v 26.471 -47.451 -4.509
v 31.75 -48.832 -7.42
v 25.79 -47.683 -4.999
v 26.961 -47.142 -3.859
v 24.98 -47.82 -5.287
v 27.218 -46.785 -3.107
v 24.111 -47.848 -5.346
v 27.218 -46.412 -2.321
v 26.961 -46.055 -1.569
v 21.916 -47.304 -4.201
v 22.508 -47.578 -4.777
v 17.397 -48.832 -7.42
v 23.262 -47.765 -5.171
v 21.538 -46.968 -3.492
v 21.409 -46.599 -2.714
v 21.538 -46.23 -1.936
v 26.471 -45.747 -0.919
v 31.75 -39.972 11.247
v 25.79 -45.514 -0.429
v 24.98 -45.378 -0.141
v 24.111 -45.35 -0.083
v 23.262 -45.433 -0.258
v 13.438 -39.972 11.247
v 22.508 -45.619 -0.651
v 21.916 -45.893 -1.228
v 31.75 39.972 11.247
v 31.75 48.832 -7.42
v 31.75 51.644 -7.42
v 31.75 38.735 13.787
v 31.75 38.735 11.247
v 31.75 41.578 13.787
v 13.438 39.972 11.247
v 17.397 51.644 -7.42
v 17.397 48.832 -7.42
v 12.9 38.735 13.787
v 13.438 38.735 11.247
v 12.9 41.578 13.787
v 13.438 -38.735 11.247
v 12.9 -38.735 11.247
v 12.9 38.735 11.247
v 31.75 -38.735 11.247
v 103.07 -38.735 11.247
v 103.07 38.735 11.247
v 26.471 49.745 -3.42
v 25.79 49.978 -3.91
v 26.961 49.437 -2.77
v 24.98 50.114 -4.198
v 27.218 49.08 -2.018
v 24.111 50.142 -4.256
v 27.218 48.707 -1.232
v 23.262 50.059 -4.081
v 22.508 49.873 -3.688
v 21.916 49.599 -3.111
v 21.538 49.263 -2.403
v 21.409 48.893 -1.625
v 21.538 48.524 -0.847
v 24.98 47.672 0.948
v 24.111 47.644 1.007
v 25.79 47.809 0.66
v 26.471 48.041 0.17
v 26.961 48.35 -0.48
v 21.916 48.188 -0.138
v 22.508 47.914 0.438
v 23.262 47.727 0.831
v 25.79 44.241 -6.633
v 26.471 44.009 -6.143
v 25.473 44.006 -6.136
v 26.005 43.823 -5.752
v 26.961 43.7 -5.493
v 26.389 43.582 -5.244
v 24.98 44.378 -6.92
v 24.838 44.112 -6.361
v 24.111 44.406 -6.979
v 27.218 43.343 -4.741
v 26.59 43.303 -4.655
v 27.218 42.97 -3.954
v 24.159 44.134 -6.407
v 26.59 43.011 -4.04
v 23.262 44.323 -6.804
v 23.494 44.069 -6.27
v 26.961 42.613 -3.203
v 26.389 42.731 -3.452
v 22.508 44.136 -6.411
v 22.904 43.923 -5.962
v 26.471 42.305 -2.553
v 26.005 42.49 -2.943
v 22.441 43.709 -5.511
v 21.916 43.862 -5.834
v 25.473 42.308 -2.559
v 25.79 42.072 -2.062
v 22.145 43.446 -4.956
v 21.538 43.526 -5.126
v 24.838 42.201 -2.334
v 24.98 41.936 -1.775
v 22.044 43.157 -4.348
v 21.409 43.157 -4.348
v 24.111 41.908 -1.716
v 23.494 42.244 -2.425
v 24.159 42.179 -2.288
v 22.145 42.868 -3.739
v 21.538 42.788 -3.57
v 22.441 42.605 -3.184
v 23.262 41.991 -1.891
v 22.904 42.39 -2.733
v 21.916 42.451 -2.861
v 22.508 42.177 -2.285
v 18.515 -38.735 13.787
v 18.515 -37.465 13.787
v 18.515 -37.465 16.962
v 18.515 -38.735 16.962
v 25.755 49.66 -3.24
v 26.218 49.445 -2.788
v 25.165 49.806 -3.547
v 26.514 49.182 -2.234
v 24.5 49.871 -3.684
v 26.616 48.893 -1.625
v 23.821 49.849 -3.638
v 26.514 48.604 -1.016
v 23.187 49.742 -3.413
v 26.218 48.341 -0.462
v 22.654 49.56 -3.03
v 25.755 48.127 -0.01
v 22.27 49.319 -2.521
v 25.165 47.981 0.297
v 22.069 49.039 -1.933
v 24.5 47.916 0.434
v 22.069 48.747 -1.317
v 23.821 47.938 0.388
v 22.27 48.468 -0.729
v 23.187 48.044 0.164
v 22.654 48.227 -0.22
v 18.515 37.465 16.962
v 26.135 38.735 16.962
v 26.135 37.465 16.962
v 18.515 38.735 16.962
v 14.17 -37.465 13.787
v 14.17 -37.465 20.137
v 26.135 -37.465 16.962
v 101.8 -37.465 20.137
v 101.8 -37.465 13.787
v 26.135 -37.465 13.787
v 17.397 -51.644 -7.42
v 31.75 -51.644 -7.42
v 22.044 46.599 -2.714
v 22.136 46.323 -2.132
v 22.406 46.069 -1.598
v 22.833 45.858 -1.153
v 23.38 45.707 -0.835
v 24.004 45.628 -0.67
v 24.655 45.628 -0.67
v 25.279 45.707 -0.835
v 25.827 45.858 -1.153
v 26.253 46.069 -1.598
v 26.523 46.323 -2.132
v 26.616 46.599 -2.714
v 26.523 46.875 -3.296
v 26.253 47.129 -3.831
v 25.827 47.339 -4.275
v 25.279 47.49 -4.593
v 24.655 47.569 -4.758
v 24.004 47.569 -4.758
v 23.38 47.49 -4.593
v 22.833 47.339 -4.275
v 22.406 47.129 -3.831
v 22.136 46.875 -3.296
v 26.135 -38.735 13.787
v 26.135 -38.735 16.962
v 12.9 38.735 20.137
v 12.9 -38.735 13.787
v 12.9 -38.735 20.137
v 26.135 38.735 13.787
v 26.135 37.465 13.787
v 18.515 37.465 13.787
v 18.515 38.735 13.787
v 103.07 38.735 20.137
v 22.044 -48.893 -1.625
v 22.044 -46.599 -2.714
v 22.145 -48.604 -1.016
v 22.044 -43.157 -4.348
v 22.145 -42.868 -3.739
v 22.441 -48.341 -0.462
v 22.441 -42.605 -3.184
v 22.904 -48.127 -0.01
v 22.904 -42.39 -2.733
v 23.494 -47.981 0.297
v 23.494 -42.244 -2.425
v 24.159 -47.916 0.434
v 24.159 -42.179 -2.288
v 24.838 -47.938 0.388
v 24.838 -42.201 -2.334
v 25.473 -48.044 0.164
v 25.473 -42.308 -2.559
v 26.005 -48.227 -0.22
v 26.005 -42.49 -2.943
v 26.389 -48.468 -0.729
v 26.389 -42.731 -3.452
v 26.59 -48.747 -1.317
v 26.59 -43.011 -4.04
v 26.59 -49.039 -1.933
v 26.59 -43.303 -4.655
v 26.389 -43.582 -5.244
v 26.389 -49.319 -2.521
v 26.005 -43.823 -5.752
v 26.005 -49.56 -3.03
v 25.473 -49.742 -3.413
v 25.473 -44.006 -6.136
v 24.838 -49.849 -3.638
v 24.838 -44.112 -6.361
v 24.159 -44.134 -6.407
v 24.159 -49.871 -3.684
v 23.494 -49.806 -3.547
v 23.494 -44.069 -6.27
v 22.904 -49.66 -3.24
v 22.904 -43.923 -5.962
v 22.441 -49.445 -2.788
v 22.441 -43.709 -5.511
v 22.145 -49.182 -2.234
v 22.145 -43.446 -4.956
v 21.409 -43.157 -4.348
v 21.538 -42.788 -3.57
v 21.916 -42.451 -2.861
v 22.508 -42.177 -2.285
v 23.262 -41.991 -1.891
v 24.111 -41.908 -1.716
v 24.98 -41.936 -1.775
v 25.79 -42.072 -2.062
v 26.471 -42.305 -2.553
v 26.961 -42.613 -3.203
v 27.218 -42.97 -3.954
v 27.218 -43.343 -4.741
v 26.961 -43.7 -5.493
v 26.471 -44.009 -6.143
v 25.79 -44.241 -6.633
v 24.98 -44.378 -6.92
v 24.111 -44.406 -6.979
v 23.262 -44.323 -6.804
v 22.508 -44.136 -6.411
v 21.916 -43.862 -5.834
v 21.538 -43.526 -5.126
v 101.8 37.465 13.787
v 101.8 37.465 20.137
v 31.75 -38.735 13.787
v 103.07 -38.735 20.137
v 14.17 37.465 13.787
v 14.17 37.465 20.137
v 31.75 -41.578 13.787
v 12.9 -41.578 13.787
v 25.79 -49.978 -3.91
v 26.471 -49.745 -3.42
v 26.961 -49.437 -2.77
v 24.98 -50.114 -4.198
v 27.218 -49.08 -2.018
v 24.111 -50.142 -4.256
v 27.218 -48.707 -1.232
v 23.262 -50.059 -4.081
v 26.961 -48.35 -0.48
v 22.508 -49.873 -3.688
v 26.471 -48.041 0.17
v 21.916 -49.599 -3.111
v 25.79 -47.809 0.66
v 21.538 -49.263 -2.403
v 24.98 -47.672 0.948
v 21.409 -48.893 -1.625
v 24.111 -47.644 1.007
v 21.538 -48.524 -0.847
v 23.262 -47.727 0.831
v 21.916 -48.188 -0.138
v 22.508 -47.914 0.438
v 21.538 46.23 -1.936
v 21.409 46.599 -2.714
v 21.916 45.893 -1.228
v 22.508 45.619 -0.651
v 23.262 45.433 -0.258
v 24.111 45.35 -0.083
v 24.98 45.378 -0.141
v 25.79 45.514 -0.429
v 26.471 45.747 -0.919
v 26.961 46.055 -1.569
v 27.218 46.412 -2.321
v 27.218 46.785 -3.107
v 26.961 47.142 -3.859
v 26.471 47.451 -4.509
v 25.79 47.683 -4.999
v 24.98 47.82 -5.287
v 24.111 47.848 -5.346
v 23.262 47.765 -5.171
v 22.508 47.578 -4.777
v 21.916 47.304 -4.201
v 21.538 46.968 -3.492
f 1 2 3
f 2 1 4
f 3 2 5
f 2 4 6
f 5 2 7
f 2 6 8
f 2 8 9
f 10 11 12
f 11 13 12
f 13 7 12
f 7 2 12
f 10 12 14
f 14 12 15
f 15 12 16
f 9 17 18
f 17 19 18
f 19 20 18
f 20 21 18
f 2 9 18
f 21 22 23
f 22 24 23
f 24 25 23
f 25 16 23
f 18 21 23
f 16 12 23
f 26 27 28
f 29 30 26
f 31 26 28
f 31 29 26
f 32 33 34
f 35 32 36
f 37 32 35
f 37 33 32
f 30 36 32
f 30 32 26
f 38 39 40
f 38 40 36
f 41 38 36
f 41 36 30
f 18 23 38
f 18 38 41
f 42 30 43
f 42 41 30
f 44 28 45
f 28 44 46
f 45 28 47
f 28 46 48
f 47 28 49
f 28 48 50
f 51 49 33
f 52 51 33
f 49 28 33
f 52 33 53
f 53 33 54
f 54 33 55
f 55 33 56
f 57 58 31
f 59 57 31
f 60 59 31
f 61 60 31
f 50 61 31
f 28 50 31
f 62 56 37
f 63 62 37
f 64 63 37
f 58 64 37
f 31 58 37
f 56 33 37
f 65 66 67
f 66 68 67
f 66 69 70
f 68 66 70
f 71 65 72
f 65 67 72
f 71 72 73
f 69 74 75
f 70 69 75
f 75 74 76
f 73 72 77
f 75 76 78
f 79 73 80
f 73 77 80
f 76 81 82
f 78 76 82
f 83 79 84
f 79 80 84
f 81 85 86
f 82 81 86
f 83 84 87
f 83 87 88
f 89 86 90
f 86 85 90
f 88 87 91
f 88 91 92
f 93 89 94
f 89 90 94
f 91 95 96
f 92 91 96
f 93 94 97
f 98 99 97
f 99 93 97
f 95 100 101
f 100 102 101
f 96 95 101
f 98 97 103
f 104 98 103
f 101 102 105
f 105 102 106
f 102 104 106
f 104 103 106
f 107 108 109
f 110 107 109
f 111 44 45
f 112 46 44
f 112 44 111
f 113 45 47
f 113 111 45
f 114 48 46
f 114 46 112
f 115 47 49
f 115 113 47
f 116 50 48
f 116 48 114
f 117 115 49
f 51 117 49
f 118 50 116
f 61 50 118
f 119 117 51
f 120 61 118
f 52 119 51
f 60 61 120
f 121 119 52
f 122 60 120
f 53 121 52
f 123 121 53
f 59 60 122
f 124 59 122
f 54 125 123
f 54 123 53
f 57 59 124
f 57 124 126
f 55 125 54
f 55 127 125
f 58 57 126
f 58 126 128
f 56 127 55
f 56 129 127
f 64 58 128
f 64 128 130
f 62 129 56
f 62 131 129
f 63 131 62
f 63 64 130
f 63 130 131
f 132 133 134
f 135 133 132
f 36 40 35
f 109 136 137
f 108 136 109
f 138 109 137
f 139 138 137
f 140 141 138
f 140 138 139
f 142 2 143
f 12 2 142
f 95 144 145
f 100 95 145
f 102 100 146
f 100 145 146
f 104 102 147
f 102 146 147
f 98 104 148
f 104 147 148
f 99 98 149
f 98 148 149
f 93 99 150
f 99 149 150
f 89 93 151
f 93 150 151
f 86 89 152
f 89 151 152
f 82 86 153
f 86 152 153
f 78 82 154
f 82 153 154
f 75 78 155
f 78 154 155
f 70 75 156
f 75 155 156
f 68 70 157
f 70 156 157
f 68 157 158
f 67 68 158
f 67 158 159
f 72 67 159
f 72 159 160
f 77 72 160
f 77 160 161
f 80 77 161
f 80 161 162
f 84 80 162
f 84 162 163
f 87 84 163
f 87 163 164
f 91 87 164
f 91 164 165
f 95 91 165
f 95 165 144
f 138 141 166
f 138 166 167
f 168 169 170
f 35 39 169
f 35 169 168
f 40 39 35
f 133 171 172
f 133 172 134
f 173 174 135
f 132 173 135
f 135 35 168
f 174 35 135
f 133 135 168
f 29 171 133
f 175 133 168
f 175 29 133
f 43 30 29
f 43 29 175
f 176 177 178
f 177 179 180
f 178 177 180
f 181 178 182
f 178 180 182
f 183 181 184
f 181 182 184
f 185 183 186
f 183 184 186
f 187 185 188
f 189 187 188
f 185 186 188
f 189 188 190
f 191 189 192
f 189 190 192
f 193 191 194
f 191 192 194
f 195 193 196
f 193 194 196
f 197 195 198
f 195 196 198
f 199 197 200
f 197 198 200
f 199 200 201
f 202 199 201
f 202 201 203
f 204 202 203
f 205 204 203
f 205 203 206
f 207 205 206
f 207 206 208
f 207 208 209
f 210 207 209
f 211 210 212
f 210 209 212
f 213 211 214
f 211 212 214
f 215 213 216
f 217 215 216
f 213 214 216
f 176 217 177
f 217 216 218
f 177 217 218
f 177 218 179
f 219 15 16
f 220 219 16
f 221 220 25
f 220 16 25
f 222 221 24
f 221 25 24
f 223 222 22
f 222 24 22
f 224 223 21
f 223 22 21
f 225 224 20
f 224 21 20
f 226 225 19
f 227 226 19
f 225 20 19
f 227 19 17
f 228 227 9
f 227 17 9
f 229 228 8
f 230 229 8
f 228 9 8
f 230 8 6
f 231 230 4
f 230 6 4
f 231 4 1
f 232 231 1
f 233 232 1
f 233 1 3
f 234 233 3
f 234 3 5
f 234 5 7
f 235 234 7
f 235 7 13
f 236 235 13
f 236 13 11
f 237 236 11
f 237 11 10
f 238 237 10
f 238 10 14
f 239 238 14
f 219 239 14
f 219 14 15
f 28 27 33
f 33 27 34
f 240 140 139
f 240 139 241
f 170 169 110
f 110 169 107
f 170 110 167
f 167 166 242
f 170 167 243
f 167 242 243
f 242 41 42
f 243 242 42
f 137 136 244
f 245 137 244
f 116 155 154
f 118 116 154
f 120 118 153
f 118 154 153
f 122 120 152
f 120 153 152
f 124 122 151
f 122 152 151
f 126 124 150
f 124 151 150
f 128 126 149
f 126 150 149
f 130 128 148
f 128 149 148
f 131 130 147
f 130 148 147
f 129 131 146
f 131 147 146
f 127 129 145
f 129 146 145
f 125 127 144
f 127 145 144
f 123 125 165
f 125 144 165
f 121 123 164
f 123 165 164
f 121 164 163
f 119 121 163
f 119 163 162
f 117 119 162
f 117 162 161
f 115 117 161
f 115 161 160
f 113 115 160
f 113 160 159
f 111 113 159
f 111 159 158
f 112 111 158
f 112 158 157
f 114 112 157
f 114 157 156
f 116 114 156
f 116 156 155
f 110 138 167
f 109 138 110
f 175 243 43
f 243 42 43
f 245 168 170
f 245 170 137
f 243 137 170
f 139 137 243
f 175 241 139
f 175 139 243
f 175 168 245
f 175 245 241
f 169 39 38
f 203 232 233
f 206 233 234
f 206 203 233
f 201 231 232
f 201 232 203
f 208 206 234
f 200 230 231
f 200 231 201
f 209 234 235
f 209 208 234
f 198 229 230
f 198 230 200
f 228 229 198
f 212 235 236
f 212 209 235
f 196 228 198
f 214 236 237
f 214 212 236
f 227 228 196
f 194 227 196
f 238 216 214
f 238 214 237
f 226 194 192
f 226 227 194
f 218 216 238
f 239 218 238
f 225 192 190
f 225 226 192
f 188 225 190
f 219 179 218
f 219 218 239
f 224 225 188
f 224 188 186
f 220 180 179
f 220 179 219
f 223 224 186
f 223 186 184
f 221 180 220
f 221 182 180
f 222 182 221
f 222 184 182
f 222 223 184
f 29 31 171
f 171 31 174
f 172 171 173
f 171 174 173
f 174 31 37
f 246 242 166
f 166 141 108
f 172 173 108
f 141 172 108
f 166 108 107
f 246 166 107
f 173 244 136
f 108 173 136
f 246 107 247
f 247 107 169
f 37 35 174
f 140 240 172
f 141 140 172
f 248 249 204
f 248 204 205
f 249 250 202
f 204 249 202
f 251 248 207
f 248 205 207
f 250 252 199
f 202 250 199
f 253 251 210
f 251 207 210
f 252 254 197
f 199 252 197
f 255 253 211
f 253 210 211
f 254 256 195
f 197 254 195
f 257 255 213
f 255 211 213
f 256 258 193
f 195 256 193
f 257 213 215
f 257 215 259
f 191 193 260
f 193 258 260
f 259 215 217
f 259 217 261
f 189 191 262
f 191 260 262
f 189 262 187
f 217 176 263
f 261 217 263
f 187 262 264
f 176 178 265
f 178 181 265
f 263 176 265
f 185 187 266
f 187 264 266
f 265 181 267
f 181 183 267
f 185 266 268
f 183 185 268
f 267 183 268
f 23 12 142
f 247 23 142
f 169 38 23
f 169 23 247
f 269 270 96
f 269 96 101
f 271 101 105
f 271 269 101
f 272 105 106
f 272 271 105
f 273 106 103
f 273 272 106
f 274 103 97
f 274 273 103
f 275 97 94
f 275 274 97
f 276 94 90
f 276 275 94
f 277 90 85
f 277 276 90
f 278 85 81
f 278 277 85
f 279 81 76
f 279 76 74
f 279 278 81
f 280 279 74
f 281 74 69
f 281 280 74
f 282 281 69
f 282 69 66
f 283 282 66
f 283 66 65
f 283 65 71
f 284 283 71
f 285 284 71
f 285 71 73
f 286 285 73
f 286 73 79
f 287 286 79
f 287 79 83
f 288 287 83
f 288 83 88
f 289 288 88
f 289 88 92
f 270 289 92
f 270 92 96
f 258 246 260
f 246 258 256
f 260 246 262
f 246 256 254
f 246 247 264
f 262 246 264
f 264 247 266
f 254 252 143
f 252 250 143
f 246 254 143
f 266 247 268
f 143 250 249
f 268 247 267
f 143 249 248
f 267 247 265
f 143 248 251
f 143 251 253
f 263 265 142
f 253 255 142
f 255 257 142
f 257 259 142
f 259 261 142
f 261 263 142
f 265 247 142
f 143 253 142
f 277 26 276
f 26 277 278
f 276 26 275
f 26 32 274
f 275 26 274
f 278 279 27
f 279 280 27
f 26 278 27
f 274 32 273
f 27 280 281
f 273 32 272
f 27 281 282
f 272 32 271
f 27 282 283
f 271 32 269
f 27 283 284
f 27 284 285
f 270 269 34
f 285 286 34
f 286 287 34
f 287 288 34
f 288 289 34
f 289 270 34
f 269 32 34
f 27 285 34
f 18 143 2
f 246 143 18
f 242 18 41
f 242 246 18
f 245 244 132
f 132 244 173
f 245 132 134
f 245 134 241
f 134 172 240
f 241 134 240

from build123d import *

# Parameters (mm, degrees)
F1_DEPTH      = 31.75
F2_R          = 0.127
F3_DEPTH      = 56.2093301913
F3_DEPTH_BACK = 56.2093301913
F4_W          = 90.17
F4_H          = 77.47
F5_DEPTH      = 2.54
F6_W          = 90.17
F6_H          = 77.47
F6_W_2        = 87.63
F6_H_2        = 74.93
F7_DEPTH      = 6.35
F11_W         = 7.62
F11_H         = 3.175
F12_DEPTH     = 79.756
F14_R         = 2.921
F14_R_2       = 2.286
F15_DEPTH     = 6.35
F15_FACE_R    = 2.286
F16_DEPTH     = 12.9286
F17_R         = 2.070357412
F18_DEPTH     = 25.4
F20_R         = 2.286
F21_DEPTH     = 25.4


# Not quite as in the source:
# - a pattern or mirror of a feature is missing from the dataset's text; its kind, count and spacing are read off the source's solid


with BuildPart() as f1:
    # F0 (on Right) → F1 (new body)
    with BuildSketch(Plane.YZ):
        Polygon((-53.9136660383, -18.1264164896), (-39.9723188616, 11.2473889307), (39.9723188616, 11.2473889307), (53.9136660383, -18.1264164896), (56.2083301913, -17.0373267665), (41.5783543673, 13.7873889307), (-41.5783543673, 13.7873889307), (-56.2083301913, -17.0373267665), align=None)
    extrude(amount=F1_DEPTH)

    # F2 (on Front) → F3 (cut, two sides)
    with BuildSketch(Plane.XZ) as f3_sk:
        Polygon((12.8995720297, 13.7873889307), (0, 13.7873889307), (0, -18.1264164896), (19.6673367172, -18.1264164896), (35.7595719397, -19.0736036748), (35.7595719397, -7.4199110855), (17.3968738801, -7.4199110855), align=None)
        with Locations((24.329572916, -1.6249689179)):
            Circle(F2_R)
    extrude(amount=-F3_DEPTH, mode=Mode.SUBTRACT)
    extrude(f3_sk.sketch, amount=F3_DEPTH_BACK, mode=Mode.SUBTRACT)

    # F4 (on face) → F5 (join, through all)
    with BuildSketch(Plane(origin=(0, 0, 11.2473889307), x_dir=(1, 0, 0), z_dir=(0, 0, -1))):
        with Locations((57.9845720297, 0)):
            Rectangle(F4_W, F4_H)
    extrude(amount=-F5_DEPTH)

    # F6 (on face) → F7 (join)
    with BuildSketch(Plane.XY.offset(13.7873889307)):
        with Locations((57.9845720297, 0)):
            Rectangle(F6_W, F6_H)
        with Locations((57.9845720297, 0)):
            Rectangle(F6_W_2, F6_H_2, mode=Mode.SUBTRACT)
    extrude(amount=F7_DEPTH)

    # F11 (on face) → F12 (cut)
    with BuildSketch(Plane(origin=(0, 38.735, 0), x_dir=(-1, 0, 0), z_dir=(0, 1, 0))):
        with Locations((-22.3247860149, 15.3748889307)):
            Rectangle(F11_W, F11_H)
    extrude(amount=-F12_DEPTH, mode=Mode.SUBTRACT)

    # F14 (on face) → F15 (join)
    with BuildSketch(Plane(origin=(0, 39.2749300586, 18.6406026544), x_dir=(-1, 0, 0), z_dir=(0, 0.9034110839, 0.4287754815))):
        with Locations((-24.329572916, -22.4322813106)):
            Circle(F14_R)
        with Locations((-24.329572916, -22.4322813106)):
            Circle(F14_R_2, mode=Mode.SUBTRACT)
    f15 = extrude(amount=-F15_DEPTH)

    # F15_copies: F15 across plane
    add(f15.mirror(Plane(origin=(0, 0, 0), x_dir=(0, 0, -1), z_dir=(0, -1, 0))))

    # F14 (on face) + F15_face (on face) → F16 (cut)
    with BuildSketch(Plane(origin=(0, 39.2749300586, 18.6406026544), x_dir=(-1, 0, 0), z_dir=(0, 0.9034110839, 0.4287754815))):
        with Locations((-24.329572916, -22.4322813106)):
            Circle(F14_R)
        with Locations((-24.329572916, -22.4322813106)):
            Circle(F14_R_2, mode=Mode.SUBTRACT)
    with BuildSketch(Plane(origin=(24.329572916, 46.6004501275, -2.7177921697), x_dir=(1, 0, 0), z_dir=(0, -0.9034110839, -0.4287754815))):
        with Locations((0, 0.004132702)):
            Circle(F15_FACE_R)
        with BuildLine():
            add(Edge.make_bspline(
                [(0.127, 1.2096633209), (0.127, 0.9661745521), (-0.0635, 1.0879189365), (-0.254, 1.2096633209), (-0.0635, 1.3314077053), (0.127, 1.4531520897), (0.127, 1.2096633209)],
                knots=[1.5707963268, 1.5707963268, 1.5707963268, 3.6651914292, 3.6651914292, 5.7595865316, 5.7595865316, 7.853981634, 7.853981634, 7.853981634], degree=2, weights=[1, 0.5, 1, 0.5, 1, 0.5, 1]))
        make_face(mode=Mode.SUBTRACT)
    extrude(amount=F16_DEPTH, dir=(0, 0.9034110839, 0.4287754815), mode=Mode.SUBTRACT)

    # F17 (on face) → F18 (cut)
    with BuildSketch(Plane(origin=(0, 33.5382696761, 15.9178783467), x_dir=(1, 0, 0), z_dir=(0, -0.9034110839, -0.4287754815))):
        with Locations((24.329572916, -22.4322813106)):
            Circle(F17_R)
    extrude(amount=-F18_DEPTH, mode=Mode.SUBTRACT)

    # F20 (on face) → F21 (cut)
    with BuildSketch(Plane(origin=(0, -36.9802659056, 17.5515129313), x_dir=(-1, 0, 0), z_dir=(0, 0.9034110839, -0.4287754815))):
        with Locations((-24.329572916, -22.4322813106)):
            Circle(F20_R)
    extrude(amount=-F21_DEPTH, mode=Mode.SUBTRACT)


solid = f1.part
